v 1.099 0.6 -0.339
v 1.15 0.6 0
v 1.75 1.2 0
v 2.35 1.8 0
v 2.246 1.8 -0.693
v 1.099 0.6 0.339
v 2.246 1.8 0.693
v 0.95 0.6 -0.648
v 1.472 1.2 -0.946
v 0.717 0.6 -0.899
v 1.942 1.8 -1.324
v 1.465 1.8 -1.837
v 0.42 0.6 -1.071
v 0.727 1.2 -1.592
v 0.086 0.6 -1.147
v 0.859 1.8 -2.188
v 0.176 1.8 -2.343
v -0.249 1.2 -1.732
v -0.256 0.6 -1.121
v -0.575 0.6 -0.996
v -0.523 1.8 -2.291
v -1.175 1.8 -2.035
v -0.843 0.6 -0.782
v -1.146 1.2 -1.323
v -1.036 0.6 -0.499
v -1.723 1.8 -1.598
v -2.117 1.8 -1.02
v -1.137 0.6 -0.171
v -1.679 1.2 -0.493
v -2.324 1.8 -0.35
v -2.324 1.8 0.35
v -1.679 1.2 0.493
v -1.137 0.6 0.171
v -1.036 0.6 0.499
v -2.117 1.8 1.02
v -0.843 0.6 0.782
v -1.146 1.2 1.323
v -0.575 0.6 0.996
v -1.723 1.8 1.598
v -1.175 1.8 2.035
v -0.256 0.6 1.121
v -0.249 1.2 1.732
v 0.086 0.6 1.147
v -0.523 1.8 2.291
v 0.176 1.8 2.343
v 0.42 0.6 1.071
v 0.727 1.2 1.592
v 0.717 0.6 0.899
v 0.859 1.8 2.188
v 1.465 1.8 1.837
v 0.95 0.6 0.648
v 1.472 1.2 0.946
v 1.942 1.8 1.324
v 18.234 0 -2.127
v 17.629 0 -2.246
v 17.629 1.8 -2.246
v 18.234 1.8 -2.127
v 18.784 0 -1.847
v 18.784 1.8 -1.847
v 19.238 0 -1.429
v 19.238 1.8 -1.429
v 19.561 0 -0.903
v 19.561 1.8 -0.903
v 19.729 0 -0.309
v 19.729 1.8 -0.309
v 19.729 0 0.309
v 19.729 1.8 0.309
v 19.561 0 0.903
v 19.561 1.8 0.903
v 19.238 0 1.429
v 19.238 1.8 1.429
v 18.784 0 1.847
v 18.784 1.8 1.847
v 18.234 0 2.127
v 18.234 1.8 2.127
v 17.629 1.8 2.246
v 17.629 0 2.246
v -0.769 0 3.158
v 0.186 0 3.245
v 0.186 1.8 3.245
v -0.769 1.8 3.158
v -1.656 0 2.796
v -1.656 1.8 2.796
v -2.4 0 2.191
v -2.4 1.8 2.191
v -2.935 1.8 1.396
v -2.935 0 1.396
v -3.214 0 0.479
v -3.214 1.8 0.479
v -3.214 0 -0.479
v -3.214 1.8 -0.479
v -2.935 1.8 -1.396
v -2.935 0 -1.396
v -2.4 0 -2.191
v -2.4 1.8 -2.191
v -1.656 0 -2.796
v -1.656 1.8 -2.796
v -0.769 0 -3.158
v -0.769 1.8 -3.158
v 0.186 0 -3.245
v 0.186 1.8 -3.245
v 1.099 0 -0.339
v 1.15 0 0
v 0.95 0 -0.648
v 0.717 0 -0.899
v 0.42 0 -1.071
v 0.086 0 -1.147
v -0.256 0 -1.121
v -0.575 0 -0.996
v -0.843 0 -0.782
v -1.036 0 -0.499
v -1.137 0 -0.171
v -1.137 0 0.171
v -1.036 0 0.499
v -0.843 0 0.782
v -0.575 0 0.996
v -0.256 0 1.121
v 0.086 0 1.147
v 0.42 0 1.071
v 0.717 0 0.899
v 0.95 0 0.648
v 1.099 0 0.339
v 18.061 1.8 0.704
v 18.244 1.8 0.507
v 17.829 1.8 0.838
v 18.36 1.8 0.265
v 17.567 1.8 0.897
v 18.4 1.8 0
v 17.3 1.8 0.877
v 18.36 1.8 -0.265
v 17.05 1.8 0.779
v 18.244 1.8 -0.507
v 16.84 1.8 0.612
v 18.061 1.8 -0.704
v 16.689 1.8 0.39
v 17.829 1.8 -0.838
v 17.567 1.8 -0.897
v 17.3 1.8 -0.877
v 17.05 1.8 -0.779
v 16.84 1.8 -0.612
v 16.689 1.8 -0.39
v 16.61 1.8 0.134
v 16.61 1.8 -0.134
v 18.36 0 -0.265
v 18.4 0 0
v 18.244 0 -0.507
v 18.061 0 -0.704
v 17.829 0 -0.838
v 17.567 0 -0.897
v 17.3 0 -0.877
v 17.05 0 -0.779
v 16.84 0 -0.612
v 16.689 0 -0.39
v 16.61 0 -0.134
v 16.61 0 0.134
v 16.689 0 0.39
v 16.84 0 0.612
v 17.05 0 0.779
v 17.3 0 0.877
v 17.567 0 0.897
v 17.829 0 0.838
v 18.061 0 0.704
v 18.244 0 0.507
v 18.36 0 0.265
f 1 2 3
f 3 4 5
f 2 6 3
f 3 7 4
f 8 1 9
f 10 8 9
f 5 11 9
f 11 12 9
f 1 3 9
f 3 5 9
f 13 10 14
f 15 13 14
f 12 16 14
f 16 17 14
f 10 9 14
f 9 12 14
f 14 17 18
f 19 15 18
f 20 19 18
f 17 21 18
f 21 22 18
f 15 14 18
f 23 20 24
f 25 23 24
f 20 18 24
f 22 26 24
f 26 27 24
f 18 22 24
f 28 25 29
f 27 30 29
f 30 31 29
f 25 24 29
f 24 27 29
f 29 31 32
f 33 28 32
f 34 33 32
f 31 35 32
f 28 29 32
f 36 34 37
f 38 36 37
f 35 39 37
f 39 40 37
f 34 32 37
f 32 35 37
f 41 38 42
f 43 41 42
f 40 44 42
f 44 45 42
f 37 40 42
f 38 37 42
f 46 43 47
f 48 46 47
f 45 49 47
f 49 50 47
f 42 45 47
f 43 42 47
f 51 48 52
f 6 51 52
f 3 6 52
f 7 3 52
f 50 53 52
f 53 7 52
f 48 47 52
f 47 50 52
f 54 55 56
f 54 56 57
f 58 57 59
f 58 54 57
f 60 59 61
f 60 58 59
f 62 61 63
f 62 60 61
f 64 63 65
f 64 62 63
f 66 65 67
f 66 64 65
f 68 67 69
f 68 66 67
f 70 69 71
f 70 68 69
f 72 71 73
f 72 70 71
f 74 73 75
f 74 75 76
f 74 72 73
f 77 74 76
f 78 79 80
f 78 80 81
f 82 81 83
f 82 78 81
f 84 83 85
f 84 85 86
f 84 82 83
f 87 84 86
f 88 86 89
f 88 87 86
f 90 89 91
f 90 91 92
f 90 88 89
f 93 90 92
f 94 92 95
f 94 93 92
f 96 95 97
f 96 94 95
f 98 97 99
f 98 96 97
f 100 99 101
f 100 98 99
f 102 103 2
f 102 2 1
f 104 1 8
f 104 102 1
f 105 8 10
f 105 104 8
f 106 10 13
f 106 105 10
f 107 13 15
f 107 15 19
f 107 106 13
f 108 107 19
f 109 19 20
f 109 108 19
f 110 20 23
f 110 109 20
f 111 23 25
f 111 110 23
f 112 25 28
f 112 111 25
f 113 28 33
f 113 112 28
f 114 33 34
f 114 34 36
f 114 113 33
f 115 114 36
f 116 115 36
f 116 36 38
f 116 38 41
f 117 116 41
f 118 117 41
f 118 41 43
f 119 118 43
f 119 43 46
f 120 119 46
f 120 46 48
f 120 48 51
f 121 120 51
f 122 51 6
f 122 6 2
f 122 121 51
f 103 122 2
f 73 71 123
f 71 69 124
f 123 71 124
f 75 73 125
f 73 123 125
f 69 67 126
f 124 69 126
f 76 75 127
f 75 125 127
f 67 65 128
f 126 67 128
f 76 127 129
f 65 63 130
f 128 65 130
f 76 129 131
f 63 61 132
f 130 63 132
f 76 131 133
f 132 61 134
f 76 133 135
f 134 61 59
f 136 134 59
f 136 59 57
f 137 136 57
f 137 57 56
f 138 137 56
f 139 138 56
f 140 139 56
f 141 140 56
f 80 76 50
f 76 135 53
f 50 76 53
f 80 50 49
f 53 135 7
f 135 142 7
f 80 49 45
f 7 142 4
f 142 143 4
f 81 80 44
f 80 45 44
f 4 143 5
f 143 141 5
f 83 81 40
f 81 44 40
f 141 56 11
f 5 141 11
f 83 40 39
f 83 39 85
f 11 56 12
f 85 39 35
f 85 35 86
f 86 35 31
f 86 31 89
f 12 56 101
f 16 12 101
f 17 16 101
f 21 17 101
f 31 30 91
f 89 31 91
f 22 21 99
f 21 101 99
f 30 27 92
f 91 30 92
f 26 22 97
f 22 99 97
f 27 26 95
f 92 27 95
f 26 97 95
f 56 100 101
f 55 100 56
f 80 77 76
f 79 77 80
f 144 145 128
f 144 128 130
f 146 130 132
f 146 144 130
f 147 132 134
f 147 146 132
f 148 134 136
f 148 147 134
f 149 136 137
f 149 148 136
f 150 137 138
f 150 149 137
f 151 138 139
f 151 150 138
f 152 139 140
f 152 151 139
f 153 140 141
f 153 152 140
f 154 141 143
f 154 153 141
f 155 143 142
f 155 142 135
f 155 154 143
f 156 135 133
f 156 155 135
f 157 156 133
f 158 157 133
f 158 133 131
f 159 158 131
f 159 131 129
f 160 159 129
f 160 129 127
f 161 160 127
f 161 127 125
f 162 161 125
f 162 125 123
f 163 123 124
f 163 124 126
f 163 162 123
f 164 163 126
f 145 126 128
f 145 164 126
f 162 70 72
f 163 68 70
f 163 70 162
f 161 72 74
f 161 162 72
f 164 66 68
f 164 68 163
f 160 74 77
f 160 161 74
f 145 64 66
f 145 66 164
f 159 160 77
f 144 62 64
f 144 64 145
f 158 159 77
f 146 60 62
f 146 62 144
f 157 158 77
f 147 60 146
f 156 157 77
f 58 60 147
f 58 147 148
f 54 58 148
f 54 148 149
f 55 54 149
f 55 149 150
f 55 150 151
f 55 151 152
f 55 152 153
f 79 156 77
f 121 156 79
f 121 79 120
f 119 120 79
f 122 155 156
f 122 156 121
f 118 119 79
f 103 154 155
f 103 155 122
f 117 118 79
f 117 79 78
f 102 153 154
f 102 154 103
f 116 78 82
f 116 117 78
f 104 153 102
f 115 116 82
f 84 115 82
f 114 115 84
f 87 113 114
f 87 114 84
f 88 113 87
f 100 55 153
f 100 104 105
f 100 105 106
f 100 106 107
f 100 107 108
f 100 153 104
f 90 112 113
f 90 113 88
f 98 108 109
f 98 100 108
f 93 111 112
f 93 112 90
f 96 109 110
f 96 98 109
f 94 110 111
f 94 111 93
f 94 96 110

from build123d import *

# Parameters (mm, degrees)
SKETCH_1_R      = 1.15
SKETCH_1_R_2    = 0.9
EXTRUDE_1_DEPTH = 1.8
CHAMFER_1_SIZE  = 1.2


with BuildPart() as part:
    # Эскиз1 → Бобышка-Вытянуть1 (new body)
    with BuildSketch(Plane(origin=(0, 0, 0), x_dir=(1, 0, 0), z_dir=(0, 1, 0))):
        with BuildLine():
            Line((0.185714286, 3.244689539), (17.628571429, 2.246323527))
            ThreePointArc((17.628571429, 2.246323527), (19.75, 0), (17.628571429, -2.246323527))
            Line((17.628571429, -2.246323527), (0.185714286, -3.244689539))
            ThreePointArc((0.185714286, -3.244689539), (-3.25, 0), (0.185714286, 3.244689539))
        make_face()
        Circle(SKETCH_1_R, mode=Mode.SUBTRACT)
        with Locations((17.5, 0)):
            Circle(SKETCH_1_R_2, mode=Mode.SUBTRACT)
    extrude(amount=EXTRUDE_1_DEPTH)

    # Фаска1
    chamfer_1_edges = [part.edges().sort_by_distance(p)[0] for p in [
        (-1.15, 1.8, 0),
    ]]
    chamfer(chamfer_1_edges, length=CHAMFER_1_SIZE)


solid = part.part
